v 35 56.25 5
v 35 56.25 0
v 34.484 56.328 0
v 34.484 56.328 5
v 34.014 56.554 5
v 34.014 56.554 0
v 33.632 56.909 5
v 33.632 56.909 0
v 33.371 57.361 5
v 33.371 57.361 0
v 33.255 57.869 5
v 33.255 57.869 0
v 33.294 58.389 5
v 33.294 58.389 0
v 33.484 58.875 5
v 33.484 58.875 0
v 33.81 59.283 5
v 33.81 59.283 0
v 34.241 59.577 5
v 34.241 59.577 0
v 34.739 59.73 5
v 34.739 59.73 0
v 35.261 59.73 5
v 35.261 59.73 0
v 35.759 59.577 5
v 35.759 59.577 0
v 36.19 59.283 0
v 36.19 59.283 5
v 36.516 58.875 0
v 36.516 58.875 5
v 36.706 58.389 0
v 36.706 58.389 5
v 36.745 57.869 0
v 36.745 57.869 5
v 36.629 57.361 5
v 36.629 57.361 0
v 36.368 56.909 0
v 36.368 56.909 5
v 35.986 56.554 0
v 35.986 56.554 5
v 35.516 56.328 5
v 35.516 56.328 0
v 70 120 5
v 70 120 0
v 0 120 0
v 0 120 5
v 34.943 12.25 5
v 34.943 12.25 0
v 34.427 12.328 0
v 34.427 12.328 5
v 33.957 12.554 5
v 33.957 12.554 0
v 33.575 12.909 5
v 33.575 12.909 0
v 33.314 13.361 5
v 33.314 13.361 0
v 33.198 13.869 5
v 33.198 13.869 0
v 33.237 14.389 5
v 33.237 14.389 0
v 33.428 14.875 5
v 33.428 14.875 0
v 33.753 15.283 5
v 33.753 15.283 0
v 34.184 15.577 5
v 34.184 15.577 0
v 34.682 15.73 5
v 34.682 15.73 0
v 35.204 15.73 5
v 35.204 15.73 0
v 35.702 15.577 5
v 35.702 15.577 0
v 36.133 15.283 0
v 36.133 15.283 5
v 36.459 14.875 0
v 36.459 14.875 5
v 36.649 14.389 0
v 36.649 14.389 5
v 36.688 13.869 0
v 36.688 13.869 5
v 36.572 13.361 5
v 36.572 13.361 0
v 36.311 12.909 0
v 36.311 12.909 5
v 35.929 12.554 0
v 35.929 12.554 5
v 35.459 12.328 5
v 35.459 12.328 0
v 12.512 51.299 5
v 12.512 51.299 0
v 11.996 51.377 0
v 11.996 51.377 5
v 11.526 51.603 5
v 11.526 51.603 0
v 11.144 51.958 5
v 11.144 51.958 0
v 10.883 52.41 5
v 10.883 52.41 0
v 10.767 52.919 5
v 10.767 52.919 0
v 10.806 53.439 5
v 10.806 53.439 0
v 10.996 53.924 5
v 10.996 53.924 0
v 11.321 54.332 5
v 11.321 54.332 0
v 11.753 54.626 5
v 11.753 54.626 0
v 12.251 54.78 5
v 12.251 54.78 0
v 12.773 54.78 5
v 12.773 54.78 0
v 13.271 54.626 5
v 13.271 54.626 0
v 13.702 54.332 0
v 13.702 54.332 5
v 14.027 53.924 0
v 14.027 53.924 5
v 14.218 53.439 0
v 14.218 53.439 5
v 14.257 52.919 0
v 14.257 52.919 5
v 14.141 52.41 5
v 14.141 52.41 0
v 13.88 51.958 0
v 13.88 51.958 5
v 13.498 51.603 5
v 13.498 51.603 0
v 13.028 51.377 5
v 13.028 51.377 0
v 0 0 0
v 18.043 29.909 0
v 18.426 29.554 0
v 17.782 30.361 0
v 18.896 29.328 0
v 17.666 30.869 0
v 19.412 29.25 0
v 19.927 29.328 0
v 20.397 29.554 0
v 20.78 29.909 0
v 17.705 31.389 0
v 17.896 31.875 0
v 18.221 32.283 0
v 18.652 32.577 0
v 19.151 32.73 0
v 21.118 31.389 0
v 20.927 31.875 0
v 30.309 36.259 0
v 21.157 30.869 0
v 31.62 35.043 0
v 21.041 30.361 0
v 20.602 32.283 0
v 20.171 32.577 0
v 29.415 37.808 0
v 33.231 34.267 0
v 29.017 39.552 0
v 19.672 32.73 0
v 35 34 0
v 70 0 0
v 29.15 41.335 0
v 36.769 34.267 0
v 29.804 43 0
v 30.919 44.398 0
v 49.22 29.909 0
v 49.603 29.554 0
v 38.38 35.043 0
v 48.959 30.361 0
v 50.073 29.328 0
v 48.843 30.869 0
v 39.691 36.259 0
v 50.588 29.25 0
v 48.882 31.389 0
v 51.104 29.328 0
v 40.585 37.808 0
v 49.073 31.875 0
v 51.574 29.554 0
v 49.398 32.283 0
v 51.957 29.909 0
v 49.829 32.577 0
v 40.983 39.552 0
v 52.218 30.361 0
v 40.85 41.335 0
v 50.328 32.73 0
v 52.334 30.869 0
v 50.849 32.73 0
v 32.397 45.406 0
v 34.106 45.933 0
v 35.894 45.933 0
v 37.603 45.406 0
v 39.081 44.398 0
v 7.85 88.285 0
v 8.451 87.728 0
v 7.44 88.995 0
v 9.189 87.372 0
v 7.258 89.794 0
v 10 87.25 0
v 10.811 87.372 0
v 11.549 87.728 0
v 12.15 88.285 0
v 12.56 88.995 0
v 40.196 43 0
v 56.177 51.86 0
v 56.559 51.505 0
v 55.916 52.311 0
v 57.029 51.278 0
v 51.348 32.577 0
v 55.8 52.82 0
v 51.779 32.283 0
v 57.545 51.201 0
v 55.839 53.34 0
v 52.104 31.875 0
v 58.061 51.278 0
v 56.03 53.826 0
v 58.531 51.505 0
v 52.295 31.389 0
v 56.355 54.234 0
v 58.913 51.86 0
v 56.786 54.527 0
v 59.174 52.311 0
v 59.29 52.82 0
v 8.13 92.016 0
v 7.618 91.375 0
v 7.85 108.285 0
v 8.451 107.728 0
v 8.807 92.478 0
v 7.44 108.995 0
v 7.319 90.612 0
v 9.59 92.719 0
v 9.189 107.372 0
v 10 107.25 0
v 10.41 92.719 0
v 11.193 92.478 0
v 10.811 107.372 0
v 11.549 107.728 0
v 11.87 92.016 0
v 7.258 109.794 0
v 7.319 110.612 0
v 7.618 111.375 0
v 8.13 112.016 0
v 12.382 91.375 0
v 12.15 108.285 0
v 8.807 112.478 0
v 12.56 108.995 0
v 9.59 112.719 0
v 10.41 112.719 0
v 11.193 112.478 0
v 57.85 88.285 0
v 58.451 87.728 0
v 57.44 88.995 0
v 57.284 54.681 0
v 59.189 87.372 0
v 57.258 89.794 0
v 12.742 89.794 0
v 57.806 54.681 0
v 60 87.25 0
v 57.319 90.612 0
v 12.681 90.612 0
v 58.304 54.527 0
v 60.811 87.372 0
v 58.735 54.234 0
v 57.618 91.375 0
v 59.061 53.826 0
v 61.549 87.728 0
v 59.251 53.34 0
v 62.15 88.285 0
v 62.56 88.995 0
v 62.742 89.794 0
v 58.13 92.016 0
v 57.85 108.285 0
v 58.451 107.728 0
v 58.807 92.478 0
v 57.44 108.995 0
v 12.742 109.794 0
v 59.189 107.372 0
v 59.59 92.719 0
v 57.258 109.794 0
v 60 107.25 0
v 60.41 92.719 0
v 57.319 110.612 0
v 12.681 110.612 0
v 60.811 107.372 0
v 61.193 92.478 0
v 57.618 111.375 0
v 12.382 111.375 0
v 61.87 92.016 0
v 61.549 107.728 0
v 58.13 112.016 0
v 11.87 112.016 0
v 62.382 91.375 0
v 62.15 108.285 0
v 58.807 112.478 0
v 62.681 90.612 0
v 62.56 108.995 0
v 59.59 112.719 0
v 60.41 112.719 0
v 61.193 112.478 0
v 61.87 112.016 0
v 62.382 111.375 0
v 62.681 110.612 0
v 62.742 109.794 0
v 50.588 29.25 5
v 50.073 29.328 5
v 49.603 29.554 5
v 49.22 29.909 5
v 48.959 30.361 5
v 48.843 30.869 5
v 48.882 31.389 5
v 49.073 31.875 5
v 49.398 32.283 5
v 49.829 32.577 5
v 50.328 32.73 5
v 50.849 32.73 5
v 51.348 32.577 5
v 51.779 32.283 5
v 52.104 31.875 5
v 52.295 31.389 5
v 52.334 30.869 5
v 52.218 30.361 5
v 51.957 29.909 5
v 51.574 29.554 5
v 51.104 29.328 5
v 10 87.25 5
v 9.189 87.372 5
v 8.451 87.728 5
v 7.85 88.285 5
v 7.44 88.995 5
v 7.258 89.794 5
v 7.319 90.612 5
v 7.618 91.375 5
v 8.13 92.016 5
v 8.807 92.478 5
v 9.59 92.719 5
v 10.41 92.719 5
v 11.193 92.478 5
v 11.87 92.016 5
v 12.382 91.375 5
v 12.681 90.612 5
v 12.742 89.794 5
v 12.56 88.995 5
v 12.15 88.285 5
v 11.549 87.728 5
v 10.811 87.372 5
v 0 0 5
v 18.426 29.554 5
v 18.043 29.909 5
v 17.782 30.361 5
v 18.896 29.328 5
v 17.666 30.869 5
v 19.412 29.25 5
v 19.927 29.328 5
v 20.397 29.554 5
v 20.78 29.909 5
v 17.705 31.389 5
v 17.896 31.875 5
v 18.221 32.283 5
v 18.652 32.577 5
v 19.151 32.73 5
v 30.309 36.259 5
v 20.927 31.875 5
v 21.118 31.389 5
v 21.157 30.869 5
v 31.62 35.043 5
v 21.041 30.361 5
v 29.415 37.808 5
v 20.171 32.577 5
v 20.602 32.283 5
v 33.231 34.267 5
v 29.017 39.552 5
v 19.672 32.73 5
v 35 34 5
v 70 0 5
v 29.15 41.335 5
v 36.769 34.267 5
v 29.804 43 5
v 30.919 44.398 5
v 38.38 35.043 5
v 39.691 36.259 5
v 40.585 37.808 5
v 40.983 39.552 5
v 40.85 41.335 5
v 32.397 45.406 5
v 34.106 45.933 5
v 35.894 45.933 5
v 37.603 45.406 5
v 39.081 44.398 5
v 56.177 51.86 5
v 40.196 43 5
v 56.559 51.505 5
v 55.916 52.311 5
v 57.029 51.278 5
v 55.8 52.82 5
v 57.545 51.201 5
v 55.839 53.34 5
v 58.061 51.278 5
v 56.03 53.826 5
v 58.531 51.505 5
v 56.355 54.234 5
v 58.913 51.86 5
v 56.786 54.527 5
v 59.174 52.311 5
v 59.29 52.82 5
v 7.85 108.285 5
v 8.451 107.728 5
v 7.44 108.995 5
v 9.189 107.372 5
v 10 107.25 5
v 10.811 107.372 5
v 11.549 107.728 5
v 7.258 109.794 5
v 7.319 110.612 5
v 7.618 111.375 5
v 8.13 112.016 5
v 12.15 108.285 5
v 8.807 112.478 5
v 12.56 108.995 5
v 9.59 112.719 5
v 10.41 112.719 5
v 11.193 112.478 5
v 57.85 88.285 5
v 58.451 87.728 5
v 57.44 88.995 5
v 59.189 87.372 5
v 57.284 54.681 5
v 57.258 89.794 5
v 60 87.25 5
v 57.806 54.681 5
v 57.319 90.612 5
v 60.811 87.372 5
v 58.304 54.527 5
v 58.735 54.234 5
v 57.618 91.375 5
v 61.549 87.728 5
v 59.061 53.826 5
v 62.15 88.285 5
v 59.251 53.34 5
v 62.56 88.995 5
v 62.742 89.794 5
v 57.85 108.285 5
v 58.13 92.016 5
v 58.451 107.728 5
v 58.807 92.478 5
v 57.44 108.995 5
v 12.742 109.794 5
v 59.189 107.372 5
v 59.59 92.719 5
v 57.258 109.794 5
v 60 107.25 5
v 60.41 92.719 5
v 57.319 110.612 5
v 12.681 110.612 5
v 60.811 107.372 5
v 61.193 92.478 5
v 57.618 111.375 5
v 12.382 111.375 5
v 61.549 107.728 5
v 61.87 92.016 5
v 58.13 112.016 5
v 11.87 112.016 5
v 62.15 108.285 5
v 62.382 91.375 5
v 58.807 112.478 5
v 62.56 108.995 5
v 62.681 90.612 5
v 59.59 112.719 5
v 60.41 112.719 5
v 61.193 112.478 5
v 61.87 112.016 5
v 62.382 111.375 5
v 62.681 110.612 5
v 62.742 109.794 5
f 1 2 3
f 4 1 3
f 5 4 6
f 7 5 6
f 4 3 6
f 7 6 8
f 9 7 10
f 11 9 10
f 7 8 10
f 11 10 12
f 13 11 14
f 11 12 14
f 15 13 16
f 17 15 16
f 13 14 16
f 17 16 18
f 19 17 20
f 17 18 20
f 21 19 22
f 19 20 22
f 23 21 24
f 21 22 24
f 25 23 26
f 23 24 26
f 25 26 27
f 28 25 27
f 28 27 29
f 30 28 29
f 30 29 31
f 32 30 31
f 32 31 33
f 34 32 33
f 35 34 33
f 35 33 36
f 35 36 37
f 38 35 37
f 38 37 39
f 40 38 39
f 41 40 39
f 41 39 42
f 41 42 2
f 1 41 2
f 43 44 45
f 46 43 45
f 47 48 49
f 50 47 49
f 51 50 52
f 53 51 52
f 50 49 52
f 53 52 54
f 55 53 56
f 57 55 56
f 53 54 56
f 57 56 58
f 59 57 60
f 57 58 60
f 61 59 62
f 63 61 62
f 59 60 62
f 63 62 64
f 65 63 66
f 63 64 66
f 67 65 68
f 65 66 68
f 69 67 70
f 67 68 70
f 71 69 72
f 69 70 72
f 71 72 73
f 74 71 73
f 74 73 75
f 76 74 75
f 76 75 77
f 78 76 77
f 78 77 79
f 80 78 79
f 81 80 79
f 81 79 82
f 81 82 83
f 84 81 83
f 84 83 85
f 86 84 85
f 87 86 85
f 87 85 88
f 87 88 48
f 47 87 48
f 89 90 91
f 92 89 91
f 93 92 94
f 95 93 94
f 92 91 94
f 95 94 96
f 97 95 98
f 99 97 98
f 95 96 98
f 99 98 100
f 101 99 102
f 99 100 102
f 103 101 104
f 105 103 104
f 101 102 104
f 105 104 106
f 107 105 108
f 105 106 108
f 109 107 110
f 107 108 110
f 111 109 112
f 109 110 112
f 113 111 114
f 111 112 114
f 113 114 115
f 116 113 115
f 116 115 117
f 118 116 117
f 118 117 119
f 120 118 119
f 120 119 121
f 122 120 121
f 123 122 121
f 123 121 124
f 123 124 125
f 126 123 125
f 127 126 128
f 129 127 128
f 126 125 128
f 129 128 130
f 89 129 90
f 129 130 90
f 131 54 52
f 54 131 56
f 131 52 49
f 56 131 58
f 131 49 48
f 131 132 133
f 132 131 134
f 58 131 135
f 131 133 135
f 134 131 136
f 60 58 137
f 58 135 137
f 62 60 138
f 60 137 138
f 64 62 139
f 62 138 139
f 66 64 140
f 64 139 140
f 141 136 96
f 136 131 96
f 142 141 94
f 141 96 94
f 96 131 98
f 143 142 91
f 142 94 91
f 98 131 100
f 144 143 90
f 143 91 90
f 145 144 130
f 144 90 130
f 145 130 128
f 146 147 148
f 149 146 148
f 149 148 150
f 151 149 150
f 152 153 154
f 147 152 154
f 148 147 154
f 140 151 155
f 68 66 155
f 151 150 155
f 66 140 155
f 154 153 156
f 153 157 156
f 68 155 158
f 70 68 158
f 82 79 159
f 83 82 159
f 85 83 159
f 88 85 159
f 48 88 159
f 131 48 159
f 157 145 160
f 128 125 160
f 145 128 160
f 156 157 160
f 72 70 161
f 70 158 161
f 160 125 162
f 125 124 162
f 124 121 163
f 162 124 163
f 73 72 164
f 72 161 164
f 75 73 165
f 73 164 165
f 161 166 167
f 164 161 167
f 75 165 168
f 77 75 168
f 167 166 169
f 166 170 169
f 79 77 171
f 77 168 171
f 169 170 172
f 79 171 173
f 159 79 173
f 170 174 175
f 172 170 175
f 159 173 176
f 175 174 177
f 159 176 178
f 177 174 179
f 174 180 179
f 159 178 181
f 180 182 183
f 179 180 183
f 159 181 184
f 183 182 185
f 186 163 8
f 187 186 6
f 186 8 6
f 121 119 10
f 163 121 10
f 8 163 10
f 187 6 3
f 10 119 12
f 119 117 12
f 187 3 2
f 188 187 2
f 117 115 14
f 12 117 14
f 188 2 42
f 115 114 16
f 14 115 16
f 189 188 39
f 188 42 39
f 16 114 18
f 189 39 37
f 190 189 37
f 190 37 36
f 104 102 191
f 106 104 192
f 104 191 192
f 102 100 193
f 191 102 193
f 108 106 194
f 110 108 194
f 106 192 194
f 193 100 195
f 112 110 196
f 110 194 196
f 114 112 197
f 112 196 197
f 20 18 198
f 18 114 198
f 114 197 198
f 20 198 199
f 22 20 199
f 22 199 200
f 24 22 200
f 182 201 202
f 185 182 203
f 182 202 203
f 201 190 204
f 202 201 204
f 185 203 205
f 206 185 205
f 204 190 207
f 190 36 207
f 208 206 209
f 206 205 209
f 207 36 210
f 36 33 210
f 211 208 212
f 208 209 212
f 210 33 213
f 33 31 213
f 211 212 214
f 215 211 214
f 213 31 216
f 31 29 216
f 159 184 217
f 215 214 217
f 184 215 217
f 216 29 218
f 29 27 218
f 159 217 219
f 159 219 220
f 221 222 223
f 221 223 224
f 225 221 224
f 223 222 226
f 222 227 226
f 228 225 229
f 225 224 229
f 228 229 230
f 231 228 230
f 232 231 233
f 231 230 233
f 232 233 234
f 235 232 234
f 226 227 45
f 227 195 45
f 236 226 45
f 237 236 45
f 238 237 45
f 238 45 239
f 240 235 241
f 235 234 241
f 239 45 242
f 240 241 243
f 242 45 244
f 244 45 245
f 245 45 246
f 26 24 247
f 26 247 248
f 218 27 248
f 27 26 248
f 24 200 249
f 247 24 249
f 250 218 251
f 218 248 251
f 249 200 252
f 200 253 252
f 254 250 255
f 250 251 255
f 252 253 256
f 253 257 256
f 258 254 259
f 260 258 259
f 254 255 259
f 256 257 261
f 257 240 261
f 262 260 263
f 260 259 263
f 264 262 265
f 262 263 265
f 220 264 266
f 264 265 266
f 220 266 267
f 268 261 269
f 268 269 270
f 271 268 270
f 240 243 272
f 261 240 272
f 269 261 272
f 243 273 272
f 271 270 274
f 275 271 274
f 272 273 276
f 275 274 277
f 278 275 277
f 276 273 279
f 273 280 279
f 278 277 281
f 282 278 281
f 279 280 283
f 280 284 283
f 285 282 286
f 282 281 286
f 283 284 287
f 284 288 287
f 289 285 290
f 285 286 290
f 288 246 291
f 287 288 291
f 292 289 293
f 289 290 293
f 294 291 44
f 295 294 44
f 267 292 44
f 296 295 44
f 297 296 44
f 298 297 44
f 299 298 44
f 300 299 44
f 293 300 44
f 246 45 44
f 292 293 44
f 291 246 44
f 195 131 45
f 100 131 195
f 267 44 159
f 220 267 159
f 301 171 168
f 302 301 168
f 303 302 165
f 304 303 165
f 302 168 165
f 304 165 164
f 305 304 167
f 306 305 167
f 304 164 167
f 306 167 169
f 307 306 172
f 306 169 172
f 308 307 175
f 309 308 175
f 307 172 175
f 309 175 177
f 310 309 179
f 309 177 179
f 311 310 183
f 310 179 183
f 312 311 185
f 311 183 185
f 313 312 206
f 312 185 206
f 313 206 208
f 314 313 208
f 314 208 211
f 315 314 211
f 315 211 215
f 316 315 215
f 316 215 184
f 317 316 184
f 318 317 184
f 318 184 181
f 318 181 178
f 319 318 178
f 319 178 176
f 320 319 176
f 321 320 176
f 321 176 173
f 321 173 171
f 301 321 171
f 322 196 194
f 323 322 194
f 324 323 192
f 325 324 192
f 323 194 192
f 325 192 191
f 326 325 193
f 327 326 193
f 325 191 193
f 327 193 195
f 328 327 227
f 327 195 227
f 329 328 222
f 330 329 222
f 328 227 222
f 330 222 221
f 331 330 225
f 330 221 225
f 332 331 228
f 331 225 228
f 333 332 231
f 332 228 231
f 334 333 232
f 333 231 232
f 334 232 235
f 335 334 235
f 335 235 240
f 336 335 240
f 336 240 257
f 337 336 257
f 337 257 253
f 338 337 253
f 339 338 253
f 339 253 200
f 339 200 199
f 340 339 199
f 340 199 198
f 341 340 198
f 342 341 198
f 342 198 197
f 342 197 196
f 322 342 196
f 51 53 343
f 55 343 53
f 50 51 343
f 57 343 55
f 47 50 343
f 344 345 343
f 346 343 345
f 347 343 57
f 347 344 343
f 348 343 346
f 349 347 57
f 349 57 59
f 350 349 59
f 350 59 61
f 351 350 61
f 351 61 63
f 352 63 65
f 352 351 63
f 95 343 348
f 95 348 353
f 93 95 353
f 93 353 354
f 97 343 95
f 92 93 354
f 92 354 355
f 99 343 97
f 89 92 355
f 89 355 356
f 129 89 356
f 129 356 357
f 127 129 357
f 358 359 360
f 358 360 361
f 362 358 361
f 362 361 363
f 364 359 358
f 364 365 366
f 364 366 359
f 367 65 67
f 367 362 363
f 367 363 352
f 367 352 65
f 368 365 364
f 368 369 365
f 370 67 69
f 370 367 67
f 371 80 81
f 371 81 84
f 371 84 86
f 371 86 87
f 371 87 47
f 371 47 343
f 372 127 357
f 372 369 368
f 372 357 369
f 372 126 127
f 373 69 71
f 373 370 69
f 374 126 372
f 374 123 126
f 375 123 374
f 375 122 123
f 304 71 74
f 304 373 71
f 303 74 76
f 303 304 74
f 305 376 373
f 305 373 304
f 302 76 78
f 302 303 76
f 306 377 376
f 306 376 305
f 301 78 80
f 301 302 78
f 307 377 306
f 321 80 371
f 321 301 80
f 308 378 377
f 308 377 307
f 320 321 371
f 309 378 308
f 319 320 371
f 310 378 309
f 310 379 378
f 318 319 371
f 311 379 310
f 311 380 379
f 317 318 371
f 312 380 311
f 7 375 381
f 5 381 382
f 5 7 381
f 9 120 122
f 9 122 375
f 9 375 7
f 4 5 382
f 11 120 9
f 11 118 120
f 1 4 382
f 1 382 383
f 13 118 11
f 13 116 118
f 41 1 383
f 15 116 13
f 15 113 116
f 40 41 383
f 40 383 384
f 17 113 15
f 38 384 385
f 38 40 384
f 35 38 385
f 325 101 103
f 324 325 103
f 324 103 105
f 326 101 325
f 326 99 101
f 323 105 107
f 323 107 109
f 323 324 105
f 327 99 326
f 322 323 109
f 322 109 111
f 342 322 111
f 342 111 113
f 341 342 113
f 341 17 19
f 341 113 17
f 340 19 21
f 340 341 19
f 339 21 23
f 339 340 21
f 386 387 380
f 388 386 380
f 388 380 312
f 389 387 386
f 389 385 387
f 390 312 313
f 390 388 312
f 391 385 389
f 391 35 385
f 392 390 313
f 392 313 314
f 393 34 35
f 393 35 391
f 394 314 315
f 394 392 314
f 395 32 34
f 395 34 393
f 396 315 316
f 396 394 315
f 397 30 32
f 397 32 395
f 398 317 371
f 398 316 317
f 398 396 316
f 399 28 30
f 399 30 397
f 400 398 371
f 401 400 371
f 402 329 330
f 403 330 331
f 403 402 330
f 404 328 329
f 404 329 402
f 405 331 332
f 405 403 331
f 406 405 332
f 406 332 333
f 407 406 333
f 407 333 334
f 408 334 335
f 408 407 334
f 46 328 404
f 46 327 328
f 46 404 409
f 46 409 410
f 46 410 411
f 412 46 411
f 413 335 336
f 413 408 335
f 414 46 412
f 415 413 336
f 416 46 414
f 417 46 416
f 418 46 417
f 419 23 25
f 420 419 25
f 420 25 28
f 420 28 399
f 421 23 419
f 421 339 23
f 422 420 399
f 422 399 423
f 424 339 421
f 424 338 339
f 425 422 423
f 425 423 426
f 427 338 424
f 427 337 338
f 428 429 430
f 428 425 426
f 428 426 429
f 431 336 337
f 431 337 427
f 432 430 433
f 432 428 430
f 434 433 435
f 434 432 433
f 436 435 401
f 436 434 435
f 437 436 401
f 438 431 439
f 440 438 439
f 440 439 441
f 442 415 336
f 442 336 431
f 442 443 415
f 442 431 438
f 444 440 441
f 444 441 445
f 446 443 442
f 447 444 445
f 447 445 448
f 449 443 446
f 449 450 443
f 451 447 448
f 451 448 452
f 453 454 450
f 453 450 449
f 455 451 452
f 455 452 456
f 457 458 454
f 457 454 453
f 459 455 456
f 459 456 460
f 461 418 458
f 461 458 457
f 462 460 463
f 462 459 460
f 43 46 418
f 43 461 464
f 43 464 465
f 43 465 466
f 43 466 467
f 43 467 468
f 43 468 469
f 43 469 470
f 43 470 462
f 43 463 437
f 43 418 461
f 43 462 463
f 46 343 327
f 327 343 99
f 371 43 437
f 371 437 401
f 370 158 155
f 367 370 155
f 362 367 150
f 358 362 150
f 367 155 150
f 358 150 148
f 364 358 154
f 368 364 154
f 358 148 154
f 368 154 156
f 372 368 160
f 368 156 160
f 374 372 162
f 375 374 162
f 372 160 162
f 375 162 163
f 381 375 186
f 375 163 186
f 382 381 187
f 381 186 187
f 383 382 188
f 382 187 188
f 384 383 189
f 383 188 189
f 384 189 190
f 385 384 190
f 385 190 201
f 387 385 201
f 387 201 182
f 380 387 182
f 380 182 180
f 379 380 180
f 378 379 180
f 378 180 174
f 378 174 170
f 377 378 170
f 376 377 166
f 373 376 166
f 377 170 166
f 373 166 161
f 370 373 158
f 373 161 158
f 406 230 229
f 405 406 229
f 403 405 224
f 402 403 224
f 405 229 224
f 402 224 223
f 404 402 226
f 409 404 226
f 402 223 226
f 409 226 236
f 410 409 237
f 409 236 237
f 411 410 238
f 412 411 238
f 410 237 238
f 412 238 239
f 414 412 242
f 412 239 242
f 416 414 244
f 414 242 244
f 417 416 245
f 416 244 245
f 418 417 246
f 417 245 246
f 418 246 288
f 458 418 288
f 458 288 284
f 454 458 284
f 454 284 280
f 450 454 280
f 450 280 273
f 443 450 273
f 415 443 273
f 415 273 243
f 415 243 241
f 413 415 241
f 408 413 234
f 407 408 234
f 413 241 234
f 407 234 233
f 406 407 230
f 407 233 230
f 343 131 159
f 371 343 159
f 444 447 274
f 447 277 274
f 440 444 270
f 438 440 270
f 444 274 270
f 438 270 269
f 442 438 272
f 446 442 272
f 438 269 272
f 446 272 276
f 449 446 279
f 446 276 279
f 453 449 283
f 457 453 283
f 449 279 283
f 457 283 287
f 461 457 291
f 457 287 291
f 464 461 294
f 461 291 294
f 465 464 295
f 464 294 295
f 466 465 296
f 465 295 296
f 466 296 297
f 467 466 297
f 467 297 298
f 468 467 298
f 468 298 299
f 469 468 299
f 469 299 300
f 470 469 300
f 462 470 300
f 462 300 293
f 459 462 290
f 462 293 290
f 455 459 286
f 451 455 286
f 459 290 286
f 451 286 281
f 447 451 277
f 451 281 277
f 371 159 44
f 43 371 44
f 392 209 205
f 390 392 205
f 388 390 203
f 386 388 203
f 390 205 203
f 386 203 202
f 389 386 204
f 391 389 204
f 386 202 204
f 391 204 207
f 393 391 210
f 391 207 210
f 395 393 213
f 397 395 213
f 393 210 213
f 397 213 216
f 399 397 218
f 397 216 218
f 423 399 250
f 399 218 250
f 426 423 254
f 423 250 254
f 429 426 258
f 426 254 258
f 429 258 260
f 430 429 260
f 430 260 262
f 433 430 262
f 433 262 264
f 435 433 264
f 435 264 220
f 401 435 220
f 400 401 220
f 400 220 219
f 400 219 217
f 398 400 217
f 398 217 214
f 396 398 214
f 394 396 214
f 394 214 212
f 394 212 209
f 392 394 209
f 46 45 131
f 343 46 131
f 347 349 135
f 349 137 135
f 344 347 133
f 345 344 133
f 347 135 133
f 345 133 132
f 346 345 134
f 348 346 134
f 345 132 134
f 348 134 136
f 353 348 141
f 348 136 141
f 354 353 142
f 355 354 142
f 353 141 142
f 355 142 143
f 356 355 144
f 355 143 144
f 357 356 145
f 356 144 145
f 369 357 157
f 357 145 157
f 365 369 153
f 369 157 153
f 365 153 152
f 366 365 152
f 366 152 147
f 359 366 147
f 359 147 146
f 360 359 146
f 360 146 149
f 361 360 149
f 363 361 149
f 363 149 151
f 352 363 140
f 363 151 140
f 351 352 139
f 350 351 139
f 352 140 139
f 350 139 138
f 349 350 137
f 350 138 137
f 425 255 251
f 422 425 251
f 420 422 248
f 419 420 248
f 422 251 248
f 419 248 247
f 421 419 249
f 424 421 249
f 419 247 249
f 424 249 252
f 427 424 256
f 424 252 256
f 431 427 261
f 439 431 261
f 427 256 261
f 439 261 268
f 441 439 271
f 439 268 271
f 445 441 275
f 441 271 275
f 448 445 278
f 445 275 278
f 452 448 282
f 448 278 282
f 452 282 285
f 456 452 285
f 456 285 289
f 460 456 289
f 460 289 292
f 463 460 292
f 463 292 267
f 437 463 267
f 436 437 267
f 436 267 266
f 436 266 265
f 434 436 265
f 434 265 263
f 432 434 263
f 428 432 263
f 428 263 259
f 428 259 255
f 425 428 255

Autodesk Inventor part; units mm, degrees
ref_plane "YZ Plane" through (0, 0, 0) normal (1, 0, 0) x (0, 1, 0)
ref_plane "XZ Plane" through (0, 0, 0) normal (0, 1, 0) x (-1, 0, 0)
ref_plane "XY Plane" through (0, 0, 0) normal (0, 0, 1) x (1, 0, 0)
sketch "スケッチ1" plane through (0, 0, 0) normal (0, 0, 1) x (1, 0, 0)
  line L0 (0, 0) -> (70, 0)
  line L1 (70, 0) -> (70, 120)
  line L2 (70, 120) -> (0, 120)
  line L3 (0, 120) -> (0, 0)
  dimension "d0" = 70
  dimension "d1" = 120
extrude "押し出し1" add sketch "スケッチ1" along normal blind 5
sketch "スケッチ2" plane through (0, 0, 5) normal (0, 0, 1) x (1, 0, 0)
  line L0 (0, 120) -> (0, 0) projected
  line L1 (0, 0) -> (70, 0) projected
  point P0 (35, 40)
  dimension "d4" = 35
  dimension "d5" = 40
hole "穴1" at (35, 40, 5) direction (0, 0, -1) diameter 12 end through all
sketch "スケッチ3" plane through (0, 0, 5) normal (0, 0, 1) x (1, 0, 0)
  circle A0 centre (35, 40) radius 6 projected
  point P0 (0, 0)
  point P1 (34.9431, 14)
  point P2 (57.5451, 52.9507)
  point P3 (12.5118, 53.0493)
  dimension "d13" = 26
  dimension "d16" = 360
hole "穴2" at (34.9431, 14, 5) at (35, 40, 5) at (57.5451, 52.9507, 5) at (12.5118, 53.0493, 5) direction (0, 0, -1) diameter 3.5 end through all
sketch "スケッチ4" plane through (0, 0, 5) normal (0, 0, 1) x (1, 0, 0)
  line L0 (0, 120) -> (0, 0) projected
  line L1 (0, 0) -> (70, 0) projected
  point P0 (35, 40)
  point P1 (35, 58)
  point P2 (19.4115, 31)
  point P3 (50.5885, 31)
  dimension "d27" = 35
  dimension "d28" = 40
  dimension "d29" = 18
  dimension "d32" = 360
hole "穴3" at (35, 40, 5) at (35, 58, 5) at (19.4115, 31, 5) at (50.5885, 31, 5) direction (0, 0, -1) diameter 3.5 end through all
sketch "スケッチ6" plane through (0, 0, 5) normal (0, 0, 1) x (1, 0, 0)
  line L0 (0, 120) -> (0, 0) projected
  line L1 (0, 0) -> (70, 0) projected
  point P0 (35, 40)
  point P1 (10, 110)
  point P2 (60, 110)
  point P3 (10, 90)
  point P4 (60, 90)
  dimension "d43" = 35
  dimension "d44" = 40
  dimension "d48" = 110
  dimension "d49" = 110
  dimension "d50" = 90
  dimension "d51" = 90
hole "穴4" at (35, 40, 5) at (10, 110, 5) at (60, 110, 5) at (10, 90, 5) at (60, 90, 5) direction (0, 0, -1) diameter 5.5 end through all
properties part number "エンコーダ取り付け板"
